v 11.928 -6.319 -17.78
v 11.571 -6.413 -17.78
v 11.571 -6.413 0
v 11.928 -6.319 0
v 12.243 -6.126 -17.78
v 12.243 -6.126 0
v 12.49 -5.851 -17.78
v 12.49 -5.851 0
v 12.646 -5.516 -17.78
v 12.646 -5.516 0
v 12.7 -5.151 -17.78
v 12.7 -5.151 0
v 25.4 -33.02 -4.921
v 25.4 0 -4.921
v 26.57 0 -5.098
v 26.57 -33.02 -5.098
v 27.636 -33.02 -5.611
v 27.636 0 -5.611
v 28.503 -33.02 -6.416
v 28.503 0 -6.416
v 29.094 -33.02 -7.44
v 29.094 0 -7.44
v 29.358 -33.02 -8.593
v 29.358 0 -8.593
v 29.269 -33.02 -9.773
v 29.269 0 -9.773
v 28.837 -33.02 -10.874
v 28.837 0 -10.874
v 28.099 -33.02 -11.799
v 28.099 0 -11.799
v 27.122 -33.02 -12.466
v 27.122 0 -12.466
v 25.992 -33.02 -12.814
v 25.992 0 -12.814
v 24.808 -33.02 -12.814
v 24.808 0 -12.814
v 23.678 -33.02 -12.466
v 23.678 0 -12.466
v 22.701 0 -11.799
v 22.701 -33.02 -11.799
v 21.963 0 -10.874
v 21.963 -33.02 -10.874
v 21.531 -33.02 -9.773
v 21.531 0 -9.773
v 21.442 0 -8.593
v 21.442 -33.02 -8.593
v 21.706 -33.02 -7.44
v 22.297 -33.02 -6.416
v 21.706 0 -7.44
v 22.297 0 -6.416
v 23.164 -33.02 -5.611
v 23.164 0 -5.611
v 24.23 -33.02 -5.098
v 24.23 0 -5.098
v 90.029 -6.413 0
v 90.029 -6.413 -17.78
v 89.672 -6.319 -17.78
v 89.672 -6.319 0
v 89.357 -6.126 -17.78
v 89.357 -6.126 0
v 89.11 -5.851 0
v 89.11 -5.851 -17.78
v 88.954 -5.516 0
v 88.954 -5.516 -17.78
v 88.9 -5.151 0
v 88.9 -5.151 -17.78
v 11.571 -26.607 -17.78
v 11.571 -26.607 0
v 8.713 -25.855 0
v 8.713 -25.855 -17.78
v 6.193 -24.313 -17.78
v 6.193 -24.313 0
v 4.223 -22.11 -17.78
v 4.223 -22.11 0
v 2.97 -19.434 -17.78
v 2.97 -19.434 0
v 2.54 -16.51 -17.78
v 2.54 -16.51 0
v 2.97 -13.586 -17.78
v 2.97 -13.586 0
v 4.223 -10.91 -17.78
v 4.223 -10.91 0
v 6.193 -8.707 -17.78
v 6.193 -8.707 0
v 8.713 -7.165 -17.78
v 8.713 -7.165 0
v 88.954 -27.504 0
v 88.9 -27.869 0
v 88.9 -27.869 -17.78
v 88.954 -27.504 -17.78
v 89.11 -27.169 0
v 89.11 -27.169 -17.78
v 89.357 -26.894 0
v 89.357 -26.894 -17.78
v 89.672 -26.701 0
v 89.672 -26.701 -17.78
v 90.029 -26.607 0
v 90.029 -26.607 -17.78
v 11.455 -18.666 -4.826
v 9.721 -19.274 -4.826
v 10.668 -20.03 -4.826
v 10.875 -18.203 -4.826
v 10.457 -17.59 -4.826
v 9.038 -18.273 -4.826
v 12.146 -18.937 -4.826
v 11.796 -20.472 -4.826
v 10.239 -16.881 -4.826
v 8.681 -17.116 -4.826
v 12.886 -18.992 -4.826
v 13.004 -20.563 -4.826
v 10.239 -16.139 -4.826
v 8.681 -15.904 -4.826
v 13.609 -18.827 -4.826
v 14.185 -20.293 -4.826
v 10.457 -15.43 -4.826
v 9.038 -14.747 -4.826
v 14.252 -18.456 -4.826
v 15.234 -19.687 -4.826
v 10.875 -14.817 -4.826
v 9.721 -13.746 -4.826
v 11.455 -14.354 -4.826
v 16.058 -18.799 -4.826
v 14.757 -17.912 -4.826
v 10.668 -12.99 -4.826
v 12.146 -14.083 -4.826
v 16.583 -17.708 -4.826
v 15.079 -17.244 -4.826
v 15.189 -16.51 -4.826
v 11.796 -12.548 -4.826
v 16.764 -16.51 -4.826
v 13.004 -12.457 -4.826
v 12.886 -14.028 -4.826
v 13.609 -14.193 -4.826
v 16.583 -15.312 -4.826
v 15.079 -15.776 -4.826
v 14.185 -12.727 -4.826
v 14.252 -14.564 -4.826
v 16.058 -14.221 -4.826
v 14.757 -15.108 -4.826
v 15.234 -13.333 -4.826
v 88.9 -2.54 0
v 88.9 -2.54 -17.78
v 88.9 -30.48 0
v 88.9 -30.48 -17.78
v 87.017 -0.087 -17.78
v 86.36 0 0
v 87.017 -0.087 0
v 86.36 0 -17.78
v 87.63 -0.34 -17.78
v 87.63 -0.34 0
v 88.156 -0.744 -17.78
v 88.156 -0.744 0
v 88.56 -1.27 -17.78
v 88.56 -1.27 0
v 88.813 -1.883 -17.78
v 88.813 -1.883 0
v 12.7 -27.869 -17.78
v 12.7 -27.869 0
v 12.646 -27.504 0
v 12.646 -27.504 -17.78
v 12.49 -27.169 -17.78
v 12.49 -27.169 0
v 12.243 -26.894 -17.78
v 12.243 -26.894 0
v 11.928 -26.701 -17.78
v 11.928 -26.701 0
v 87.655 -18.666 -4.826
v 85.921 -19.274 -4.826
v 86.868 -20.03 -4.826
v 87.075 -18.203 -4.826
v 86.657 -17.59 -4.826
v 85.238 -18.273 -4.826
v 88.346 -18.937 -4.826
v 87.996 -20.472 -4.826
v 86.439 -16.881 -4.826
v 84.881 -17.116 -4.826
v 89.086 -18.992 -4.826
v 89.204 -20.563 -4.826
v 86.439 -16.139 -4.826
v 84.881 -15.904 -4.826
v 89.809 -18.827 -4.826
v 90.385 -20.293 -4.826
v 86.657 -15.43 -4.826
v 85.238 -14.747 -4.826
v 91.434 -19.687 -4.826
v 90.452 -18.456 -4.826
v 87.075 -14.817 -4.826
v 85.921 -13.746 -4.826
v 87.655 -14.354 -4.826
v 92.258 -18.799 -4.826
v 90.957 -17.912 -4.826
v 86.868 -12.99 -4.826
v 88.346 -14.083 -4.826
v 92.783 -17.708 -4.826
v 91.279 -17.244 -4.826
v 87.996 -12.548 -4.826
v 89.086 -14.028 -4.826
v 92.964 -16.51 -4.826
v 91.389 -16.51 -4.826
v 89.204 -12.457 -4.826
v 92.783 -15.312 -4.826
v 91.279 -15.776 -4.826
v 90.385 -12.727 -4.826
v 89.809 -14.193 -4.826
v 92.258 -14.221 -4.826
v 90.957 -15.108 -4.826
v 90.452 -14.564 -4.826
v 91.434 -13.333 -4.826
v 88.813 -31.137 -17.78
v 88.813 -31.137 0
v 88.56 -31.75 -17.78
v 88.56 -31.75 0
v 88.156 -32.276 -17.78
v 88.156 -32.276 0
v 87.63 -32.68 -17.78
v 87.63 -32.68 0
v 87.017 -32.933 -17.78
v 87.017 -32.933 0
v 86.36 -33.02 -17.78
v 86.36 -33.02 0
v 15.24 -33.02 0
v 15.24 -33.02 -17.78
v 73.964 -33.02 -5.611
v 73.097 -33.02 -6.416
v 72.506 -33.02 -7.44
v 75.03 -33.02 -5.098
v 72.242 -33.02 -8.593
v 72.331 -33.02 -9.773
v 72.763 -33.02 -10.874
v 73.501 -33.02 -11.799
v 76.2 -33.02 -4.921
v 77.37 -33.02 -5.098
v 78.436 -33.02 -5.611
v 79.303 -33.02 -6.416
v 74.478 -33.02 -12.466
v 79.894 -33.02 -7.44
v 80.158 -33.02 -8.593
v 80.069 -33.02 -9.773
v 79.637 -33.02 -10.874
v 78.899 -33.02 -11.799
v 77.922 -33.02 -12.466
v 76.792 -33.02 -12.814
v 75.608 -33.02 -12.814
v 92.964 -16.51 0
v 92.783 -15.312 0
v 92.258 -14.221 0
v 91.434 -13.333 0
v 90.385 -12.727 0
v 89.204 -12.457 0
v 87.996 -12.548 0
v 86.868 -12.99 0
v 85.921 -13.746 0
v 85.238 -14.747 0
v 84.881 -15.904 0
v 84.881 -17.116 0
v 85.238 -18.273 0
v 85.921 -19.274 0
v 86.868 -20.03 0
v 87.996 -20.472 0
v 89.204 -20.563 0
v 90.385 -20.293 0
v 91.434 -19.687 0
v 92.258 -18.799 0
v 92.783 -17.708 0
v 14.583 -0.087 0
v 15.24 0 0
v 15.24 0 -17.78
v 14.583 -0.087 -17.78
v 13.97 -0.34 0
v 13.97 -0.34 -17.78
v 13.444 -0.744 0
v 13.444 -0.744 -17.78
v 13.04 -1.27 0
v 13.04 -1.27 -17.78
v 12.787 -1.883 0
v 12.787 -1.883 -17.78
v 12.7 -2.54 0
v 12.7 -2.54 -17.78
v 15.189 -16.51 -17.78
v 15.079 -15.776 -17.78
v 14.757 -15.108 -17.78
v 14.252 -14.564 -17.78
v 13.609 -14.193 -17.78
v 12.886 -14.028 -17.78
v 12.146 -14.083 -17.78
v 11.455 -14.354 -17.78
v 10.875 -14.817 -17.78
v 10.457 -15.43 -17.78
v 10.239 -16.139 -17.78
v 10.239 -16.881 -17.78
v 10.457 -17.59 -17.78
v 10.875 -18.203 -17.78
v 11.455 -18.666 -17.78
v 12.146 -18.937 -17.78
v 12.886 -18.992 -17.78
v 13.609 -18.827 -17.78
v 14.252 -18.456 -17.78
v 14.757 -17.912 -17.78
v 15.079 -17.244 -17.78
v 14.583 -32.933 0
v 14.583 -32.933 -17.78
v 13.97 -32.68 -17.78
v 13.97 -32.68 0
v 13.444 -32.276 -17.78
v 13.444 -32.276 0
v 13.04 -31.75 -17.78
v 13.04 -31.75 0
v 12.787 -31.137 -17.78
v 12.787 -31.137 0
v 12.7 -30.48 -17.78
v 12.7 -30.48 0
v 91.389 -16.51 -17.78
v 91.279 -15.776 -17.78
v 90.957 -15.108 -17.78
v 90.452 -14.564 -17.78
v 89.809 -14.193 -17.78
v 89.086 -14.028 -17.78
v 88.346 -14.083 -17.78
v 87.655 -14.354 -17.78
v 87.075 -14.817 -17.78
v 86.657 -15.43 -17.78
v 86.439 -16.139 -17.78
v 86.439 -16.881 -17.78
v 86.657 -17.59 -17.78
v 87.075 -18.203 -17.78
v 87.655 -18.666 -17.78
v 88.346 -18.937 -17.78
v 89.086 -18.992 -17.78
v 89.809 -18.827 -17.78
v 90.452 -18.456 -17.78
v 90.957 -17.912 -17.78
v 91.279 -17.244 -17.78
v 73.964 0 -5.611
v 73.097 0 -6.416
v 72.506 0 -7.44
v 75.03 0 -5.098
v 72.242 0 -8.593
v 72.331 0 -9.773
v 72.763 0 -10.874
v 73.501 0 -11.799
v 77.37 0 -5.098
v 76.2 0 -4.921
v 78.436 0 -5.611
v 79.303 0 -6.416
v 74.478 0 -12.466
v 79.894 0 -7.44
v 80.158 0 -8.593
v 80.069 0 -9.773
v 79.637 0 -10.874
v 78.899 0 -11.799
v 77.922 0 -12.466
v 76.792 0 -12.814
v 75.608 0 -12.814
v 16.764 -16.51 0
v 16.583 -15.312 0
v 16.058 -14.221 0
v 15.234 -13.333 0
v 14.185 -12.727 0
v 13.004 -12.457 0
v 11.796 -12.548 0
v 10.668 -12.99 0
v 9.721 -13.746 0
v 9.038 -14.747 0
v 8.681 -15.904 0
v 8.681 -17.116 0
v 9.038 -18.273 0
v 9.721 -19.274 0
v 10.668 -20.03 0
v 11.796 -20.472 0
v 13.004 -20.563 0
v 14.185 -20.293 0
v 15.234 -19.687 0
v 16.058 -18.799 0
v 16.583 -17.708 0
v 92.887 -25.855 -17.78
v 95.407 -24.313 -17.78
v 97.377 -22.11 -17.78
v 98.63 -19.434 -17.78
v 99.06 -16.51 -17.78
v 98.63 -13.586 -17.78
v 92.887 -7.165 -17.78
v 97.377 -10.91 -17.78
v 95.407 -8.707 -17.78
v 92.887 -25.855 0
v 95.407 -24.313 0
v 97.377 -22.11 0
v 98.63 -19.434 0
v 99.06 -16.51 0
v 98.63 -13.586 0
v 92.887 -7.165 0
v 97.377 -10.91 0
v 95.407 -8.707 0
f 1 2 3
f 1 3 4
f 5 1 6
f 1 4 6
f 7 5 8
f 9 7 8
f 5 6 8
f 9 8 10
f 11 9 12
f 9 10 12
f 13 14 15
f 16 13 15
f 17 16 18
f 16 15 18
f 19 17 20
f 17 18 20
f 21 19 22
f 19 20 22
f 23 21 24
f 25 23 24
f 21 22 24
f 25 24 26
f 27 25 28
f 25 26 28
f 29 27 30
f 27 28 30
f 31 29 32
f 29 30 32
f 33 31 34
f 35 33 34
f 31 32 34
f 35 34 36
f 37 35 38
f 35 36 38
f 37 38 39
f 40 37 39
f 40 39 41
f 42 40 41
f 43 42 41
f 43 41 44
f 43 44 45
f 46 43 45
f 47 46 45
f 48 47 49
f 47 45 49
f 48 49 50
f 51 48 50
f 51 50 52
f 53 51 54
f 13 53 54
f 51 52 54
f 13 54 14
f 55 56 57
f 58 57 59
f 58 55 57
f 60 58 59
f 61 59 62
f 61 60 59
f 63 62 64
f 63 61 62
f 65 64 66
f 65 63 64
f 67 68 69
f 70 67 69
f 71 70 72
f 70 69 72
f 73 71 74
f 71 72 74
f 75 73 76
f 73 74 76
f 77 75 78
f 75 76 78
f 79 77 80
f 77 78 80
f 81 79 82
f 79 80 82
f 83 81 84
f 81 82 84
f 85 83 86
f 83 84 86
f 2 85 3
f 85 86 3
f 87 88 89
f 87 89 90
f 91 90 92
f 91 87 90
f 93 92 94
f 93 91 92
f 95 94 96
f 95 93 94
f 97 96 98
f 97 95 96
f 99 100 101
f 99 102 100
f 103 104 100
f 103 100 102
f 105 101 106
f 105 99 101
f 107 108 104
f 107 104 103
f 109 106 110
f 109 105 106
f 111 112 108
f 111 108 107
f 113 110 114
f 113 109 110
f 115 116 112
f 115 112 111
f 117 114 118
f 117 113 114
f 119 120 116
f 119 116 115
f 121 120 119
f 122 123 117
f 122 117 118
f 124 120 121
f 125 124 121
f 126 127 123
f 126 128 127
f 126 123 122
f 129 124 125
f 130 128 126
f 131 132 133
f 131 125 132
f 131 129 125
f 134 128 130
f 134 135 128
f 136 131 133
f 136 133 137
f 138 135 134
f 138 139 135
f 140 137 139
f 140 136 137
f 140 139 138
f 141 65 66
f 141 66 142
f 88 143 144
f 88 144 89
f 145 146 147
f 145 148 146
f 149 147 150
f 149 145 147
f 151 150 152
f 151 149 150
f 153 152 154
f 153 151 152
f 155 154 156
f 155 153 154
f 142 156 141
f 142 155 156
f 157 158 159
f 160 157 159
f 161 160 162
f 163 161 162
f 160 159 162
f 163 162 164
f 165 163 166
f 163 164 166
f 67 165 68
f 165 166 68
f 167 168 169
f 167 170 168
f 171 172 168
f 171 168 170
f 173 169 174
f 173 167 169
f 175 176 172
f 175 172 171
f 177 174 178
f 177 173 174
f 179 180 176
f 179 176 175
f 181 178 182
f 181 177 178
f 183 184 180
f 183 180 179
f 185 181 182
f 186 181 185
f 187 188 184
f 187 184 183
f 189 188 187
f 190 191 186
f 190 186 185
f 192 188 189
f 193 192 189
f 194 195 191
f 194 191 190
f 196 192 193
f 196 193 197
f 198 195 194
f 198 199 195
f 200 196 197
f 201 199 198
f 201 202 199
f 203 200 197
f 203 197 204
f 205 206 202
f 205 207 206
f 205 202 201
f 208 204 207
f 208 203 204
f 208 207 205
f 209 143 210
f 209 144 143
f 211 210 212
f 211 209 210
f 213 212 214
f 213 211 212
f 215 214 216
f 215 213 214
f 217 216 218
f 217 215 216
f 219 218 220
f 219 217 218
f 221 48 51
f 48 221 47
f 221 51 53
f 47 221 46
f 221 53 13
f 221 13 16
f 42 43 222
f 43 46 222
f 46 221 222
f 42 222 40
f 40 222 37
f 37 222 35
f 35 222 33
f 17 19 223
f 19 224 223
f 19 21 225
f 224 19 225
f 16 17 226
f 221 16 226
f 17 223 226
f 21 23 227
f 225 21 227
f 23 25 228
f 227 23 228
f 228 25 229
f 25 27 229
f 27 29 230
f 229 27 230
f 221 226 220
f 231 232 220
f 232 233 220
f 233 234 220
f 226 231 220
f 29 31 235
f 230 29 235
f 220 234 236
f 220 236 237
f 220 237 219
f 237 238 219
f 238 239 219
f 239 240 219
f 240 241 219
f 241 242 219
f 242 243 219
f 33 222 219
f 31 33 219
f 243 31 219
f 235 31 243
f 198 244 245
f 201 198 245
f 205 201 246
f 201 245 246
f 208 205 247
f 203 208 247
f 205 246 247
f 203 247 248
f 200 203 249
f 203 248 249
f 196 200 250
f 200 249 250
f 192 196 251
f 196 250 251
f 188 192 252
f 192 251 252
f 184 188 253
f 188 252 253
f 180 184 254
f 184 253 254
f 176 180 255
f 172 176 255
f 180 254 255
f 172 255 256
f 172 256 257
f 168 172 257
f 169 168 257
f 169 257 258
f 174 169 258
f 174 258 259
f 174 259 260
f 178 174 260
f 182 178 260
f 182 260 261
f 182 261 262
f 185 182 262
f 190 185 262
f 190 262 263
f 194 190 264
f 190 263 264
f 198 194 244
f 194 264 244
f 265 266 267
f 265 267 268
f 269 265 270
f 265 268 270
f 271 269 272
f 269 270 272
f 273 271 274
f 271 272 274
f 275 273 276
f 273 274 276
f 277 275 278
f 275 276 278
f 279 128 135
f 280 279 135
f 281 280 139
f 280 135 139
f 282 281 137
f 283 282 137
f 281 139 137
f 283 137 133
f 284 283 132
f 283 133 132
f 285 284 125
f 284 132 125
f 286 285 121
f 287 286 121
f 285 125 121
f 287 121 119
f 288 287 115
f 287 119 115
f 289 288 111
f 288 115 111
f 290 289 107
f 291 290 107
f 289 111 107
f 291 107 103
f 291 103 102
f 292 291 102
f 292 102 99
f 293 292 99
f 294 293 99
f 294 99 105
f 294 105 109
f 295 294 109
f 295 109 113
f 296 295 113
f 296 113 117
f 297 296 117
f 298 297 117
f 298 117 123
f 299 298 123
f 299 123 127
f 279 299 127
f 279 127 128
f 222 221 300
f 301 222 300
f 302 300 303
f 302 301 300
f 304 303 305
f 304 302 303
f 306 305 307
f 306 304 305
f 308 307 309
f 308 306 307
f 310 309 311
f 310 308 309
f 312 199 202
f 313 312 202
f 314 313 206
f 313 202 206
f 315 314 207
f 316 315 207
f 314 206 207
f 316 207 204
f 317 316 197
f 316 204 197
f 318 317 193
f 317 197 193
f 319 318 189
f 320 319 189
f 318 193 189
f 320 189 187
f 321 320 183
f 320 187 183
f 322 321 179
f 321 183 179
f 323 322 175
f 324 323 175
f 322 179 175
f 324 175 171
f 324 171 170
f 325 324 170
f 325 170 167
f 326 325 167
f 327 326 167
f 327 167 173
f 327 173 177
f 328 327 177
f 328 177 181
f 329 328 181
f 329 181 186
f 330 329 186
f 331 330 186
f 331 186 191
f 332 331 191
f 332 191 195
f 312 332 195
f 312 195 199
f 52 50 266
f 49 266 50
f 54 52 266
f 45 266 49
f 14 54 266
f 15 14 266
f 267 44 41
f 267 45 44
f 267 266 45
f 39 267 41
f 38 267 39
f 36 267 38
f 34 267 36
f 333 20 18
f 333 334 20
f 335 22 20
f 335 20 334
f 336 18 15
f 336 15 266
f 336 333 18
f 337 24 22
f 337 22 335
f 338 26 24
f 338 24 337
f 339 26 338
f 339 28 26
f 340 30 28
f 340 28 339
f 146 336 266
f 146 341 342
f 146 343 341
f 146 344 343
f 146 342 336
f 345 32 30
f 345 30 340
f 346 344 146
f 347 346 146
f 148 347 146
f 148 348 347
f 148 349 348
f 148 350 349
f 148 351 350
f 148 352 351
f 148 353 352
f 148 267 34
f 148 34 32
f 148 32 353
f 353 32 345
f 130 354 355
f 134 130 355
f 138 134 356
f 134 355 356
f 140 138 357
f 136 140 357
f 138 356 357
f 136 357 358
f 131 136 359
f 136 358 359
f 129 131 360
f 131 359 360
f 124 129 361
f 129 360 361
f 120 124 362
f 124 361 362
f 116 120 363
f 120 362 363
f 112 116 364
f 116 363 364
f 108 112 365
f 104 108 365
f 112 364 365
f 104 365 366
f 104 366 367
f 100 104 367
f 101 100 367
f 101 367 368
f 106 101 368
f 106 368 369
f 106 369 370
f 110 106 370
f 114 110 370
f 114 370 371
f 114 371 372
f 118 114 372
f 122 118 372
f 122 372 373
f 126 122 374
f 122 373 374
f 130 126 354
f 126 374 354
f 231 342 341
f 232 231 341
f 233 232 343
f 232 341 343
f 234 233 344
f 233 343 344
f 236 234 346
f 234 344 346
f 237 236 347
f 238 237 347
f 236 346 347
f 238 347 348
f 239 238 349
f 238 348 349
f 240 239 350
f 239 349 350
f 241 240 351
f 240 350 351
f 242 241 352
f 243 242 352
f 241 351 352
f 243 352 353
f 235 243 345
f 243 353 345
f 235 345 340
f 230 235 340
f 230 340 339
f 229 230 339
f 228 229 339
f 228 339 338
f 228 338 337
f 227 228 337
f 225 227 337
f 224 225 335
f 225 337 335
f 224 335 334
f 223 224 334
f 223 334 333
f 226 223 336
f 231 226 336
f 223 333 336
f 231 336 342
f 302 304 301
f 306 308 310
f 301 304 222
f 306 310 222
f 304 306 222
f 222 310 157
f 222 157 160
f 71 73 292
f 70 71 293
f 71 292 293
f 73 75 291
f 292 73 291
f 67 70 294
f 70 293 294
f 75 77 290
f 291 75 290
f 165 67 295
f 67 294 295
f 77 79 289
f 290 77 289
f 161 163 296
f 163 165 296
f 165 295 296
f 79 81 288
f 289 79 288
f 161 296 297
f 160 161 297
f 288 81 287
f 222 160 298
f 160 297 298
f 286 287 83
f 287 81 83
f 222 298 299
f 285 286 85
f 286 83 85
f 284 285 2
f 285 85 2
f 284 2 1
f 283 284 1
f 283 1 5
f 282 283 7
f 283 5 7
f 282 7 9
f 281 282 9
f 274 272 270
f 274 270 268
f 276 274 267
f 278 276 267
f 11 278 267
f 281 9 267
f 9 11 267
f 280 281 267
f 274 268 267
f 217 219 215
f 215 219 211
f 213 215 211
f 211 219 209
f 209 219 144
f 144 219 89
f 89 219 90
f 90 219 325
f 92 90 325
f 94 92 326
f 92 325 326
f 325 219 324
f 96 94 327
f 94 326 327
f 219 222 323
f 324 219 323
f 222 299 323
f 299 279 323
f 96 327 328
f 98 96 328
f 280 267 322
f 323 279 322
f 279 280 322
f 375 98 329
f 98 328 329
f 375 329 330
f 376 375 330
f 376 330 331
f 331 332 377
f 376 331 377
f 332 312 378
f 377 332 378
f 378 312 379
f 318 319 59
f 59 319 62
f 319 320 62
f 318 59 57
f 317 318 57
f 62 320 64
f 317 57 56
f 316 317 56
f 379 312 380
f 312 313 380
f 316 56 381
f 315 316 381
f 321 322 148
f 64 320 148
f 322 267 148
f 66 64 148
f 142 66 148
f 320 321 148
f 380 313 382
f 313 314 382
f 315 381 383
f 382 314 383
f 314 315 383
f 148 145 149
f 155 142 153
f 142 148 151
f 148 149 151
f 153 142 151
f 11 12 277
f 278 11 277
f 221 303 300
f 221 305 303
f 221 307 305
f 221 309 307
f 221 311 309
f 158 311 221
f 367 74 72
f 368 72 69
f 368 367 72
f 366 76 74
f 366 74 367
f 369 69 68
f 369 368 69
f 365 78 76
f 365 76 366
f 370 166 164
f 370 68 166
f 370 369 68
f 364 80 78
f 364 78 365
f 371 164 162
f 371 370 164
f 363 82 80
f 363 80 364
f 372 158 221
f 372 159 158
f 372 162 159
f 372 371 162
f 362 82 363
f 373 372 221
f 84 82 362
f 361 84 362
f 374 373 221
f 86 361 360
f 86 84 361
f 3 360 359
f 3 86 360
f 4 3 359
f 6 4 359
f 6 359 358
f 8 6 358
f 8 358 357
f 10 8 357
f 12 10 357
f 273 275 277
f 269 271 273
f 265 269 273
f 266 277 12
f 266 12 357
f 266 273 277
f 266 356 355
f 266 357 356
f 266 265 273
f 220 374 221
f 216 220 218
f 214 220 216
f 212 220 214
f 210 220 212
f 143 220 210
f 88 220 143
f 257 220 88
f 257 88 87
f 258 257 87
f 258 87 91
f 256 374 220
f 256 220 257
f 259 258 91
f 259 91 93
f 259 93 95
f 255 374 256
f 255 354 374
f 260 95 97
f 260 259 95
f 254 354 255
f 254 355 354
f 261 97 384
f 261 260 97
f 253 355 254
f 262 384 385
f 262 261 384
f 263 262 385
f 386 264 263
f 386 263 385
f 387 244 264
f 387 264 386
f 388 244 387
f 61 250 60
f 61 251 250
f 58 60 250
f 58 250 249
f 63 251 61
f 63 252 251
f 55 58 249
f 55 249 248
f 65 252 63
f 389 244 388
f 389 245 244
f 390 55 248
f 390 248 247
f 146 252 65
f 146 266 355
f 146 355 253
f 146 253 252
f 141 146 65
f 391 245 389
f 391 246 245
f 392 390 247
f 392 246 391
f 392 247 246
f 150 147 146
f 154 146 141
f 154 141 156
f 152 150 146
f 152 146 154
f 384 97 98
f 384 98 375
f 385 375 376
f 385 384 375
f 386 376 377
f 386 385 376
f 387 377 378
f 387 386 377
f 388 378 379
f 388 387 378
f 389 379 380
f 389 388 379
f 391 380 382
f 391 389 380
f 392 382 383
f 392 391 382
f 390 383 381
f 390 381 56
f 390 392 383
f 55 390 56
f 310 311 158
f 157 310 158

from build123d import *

# Parameters (mm, degrees)
SKETCH1_W           = 101.6
SKETCH1_H           = 17.78
SKETCH1_R           = 3.96875
BOSS_EXTRUDE1_DEPTH = 33.02
SKETCH2_R           = 2.4892
CUT_EXTRUDE1_DEPTH  = 17.78
SKETCH3_R           = 4.064
CUT_EXTRUDE2_DEPTH  = 4.826
CUT_EXTRUDE3_DEPTH  = 109.300548475
FILLET1_R           = 2.54


with BuildPart() as part:
    # Sketch1 → Boss-Extrude1 (new body)
    with BuildSketch(Plane(origin=(0, 0, 0), x_dir=(1, 0, 0), z_dir=(0, 1, 0))):
        with Locations((50.8, 8.89)):
            Rectangle(SKETCH1_W, SKETCH1_H)
        with Locations(Location((76.2, 8.89, 0), (0, 0, 270))):
            Circle(SKETCH1_R, mode=Mode.SUBTRACT)
        with Locations(Location((25.4, 8.89, 0), (0, 0, 270))):
            Circle(SKETCH1_R, mode=Mode.SUBTRACT)
    extrude(amount=-BOSS_EXTRUDE1_DEPTH)

    # Sketch2 → Cut-Extrude1 (cut)
    with BuildSketch(Plane.XY):
        with Locations((88.9, -16.51)):
            Circle(SKETCH2_R)
        with Locations((12.7, -16.51)):
            Circle(SKETCH2_R)
    extrude(amount=-CUT_EXTRUDE1_DEPTH, mode=Mode.SUBTRACT)

    # Sketch3 → Cut-Extrude2 (cut)
    with BuildSketch(Plane.XY):
        with Locations((88.9, -16.51)):
            Circle(SKETCH3_R)
        with Locations((12.7, -16.51)):
            Circle(SKETCH3_R)
    extrude(amount=-CUT_EXTRUDE2_DEPTH, mode=Mode.SUBTRACT)

    # Sketch5 → Cut-Extrude3 (cut, through all)
    with BuildSketch(Plane.XY):
        with BuildLine():
            Line((12.7, -5.150774674), (12.7, 0))
            Line((12.7, 0), (0, 0))
            Line((0, 0), (0, -33.02))
            Line((0, -33.02), (12.7, -33.02))
            Line((12.7, -33.02), (12.7, -27.869225326))
            ThreePointArc((12.7, -27.869225326), (12.37660211, -27.022558659), (11.571111111, -26.607089178))
            ThreePointArc((11.571111111, -26.607089178), (2.54, -16.51), (11.571111111, -6.412910822))
            ThreePointArc((11.571111111, -6.412910822), (12.37660211, -5.997441341), (12.7, -5.150774674))
        make_face()
        with BuildLine():
            Line((88.9, -5.150774674), (88.9, 0))
            Line((88.9, 0), (101.6, 0))
            Line((101.6, 0), (101.6, -33.02))
            Line((101.6, -33.02), (88.9, -33.02))
            Line((88.9, -33.02), (88.9, -27.869225326))
            ThreePointArc((88.9, -27.869225326), (89.22339789, -27.022558659), (90.028888889, -26.607089178))
            ThreePointArc((90.028888889, -26.607089178), (99.06, -16.51), (90.028888889, -6.412910822))
            ThreePointArc((90.028888889, -6.412910822), (89.22339789, -5.997441341), (88.9, -5.150774674))
        make_face()
    extrude(amount=-CUT_EXTRUDE3_DEPTH, mode=Mode.SUBTRACT)

    # Fillet1
    fillet1_edges = [part.edges().sort_by_distance(p)[0] for p in [
        (12.7, -33.02, -8.89),
        (12.7, 0, -8.89),
        (88.9, 0, -8.89),
        (88.9, -33.02, -8.89),
    ]]
    fillet(fillet1_edges, radius=FILLET1_R)


solid = part.part
